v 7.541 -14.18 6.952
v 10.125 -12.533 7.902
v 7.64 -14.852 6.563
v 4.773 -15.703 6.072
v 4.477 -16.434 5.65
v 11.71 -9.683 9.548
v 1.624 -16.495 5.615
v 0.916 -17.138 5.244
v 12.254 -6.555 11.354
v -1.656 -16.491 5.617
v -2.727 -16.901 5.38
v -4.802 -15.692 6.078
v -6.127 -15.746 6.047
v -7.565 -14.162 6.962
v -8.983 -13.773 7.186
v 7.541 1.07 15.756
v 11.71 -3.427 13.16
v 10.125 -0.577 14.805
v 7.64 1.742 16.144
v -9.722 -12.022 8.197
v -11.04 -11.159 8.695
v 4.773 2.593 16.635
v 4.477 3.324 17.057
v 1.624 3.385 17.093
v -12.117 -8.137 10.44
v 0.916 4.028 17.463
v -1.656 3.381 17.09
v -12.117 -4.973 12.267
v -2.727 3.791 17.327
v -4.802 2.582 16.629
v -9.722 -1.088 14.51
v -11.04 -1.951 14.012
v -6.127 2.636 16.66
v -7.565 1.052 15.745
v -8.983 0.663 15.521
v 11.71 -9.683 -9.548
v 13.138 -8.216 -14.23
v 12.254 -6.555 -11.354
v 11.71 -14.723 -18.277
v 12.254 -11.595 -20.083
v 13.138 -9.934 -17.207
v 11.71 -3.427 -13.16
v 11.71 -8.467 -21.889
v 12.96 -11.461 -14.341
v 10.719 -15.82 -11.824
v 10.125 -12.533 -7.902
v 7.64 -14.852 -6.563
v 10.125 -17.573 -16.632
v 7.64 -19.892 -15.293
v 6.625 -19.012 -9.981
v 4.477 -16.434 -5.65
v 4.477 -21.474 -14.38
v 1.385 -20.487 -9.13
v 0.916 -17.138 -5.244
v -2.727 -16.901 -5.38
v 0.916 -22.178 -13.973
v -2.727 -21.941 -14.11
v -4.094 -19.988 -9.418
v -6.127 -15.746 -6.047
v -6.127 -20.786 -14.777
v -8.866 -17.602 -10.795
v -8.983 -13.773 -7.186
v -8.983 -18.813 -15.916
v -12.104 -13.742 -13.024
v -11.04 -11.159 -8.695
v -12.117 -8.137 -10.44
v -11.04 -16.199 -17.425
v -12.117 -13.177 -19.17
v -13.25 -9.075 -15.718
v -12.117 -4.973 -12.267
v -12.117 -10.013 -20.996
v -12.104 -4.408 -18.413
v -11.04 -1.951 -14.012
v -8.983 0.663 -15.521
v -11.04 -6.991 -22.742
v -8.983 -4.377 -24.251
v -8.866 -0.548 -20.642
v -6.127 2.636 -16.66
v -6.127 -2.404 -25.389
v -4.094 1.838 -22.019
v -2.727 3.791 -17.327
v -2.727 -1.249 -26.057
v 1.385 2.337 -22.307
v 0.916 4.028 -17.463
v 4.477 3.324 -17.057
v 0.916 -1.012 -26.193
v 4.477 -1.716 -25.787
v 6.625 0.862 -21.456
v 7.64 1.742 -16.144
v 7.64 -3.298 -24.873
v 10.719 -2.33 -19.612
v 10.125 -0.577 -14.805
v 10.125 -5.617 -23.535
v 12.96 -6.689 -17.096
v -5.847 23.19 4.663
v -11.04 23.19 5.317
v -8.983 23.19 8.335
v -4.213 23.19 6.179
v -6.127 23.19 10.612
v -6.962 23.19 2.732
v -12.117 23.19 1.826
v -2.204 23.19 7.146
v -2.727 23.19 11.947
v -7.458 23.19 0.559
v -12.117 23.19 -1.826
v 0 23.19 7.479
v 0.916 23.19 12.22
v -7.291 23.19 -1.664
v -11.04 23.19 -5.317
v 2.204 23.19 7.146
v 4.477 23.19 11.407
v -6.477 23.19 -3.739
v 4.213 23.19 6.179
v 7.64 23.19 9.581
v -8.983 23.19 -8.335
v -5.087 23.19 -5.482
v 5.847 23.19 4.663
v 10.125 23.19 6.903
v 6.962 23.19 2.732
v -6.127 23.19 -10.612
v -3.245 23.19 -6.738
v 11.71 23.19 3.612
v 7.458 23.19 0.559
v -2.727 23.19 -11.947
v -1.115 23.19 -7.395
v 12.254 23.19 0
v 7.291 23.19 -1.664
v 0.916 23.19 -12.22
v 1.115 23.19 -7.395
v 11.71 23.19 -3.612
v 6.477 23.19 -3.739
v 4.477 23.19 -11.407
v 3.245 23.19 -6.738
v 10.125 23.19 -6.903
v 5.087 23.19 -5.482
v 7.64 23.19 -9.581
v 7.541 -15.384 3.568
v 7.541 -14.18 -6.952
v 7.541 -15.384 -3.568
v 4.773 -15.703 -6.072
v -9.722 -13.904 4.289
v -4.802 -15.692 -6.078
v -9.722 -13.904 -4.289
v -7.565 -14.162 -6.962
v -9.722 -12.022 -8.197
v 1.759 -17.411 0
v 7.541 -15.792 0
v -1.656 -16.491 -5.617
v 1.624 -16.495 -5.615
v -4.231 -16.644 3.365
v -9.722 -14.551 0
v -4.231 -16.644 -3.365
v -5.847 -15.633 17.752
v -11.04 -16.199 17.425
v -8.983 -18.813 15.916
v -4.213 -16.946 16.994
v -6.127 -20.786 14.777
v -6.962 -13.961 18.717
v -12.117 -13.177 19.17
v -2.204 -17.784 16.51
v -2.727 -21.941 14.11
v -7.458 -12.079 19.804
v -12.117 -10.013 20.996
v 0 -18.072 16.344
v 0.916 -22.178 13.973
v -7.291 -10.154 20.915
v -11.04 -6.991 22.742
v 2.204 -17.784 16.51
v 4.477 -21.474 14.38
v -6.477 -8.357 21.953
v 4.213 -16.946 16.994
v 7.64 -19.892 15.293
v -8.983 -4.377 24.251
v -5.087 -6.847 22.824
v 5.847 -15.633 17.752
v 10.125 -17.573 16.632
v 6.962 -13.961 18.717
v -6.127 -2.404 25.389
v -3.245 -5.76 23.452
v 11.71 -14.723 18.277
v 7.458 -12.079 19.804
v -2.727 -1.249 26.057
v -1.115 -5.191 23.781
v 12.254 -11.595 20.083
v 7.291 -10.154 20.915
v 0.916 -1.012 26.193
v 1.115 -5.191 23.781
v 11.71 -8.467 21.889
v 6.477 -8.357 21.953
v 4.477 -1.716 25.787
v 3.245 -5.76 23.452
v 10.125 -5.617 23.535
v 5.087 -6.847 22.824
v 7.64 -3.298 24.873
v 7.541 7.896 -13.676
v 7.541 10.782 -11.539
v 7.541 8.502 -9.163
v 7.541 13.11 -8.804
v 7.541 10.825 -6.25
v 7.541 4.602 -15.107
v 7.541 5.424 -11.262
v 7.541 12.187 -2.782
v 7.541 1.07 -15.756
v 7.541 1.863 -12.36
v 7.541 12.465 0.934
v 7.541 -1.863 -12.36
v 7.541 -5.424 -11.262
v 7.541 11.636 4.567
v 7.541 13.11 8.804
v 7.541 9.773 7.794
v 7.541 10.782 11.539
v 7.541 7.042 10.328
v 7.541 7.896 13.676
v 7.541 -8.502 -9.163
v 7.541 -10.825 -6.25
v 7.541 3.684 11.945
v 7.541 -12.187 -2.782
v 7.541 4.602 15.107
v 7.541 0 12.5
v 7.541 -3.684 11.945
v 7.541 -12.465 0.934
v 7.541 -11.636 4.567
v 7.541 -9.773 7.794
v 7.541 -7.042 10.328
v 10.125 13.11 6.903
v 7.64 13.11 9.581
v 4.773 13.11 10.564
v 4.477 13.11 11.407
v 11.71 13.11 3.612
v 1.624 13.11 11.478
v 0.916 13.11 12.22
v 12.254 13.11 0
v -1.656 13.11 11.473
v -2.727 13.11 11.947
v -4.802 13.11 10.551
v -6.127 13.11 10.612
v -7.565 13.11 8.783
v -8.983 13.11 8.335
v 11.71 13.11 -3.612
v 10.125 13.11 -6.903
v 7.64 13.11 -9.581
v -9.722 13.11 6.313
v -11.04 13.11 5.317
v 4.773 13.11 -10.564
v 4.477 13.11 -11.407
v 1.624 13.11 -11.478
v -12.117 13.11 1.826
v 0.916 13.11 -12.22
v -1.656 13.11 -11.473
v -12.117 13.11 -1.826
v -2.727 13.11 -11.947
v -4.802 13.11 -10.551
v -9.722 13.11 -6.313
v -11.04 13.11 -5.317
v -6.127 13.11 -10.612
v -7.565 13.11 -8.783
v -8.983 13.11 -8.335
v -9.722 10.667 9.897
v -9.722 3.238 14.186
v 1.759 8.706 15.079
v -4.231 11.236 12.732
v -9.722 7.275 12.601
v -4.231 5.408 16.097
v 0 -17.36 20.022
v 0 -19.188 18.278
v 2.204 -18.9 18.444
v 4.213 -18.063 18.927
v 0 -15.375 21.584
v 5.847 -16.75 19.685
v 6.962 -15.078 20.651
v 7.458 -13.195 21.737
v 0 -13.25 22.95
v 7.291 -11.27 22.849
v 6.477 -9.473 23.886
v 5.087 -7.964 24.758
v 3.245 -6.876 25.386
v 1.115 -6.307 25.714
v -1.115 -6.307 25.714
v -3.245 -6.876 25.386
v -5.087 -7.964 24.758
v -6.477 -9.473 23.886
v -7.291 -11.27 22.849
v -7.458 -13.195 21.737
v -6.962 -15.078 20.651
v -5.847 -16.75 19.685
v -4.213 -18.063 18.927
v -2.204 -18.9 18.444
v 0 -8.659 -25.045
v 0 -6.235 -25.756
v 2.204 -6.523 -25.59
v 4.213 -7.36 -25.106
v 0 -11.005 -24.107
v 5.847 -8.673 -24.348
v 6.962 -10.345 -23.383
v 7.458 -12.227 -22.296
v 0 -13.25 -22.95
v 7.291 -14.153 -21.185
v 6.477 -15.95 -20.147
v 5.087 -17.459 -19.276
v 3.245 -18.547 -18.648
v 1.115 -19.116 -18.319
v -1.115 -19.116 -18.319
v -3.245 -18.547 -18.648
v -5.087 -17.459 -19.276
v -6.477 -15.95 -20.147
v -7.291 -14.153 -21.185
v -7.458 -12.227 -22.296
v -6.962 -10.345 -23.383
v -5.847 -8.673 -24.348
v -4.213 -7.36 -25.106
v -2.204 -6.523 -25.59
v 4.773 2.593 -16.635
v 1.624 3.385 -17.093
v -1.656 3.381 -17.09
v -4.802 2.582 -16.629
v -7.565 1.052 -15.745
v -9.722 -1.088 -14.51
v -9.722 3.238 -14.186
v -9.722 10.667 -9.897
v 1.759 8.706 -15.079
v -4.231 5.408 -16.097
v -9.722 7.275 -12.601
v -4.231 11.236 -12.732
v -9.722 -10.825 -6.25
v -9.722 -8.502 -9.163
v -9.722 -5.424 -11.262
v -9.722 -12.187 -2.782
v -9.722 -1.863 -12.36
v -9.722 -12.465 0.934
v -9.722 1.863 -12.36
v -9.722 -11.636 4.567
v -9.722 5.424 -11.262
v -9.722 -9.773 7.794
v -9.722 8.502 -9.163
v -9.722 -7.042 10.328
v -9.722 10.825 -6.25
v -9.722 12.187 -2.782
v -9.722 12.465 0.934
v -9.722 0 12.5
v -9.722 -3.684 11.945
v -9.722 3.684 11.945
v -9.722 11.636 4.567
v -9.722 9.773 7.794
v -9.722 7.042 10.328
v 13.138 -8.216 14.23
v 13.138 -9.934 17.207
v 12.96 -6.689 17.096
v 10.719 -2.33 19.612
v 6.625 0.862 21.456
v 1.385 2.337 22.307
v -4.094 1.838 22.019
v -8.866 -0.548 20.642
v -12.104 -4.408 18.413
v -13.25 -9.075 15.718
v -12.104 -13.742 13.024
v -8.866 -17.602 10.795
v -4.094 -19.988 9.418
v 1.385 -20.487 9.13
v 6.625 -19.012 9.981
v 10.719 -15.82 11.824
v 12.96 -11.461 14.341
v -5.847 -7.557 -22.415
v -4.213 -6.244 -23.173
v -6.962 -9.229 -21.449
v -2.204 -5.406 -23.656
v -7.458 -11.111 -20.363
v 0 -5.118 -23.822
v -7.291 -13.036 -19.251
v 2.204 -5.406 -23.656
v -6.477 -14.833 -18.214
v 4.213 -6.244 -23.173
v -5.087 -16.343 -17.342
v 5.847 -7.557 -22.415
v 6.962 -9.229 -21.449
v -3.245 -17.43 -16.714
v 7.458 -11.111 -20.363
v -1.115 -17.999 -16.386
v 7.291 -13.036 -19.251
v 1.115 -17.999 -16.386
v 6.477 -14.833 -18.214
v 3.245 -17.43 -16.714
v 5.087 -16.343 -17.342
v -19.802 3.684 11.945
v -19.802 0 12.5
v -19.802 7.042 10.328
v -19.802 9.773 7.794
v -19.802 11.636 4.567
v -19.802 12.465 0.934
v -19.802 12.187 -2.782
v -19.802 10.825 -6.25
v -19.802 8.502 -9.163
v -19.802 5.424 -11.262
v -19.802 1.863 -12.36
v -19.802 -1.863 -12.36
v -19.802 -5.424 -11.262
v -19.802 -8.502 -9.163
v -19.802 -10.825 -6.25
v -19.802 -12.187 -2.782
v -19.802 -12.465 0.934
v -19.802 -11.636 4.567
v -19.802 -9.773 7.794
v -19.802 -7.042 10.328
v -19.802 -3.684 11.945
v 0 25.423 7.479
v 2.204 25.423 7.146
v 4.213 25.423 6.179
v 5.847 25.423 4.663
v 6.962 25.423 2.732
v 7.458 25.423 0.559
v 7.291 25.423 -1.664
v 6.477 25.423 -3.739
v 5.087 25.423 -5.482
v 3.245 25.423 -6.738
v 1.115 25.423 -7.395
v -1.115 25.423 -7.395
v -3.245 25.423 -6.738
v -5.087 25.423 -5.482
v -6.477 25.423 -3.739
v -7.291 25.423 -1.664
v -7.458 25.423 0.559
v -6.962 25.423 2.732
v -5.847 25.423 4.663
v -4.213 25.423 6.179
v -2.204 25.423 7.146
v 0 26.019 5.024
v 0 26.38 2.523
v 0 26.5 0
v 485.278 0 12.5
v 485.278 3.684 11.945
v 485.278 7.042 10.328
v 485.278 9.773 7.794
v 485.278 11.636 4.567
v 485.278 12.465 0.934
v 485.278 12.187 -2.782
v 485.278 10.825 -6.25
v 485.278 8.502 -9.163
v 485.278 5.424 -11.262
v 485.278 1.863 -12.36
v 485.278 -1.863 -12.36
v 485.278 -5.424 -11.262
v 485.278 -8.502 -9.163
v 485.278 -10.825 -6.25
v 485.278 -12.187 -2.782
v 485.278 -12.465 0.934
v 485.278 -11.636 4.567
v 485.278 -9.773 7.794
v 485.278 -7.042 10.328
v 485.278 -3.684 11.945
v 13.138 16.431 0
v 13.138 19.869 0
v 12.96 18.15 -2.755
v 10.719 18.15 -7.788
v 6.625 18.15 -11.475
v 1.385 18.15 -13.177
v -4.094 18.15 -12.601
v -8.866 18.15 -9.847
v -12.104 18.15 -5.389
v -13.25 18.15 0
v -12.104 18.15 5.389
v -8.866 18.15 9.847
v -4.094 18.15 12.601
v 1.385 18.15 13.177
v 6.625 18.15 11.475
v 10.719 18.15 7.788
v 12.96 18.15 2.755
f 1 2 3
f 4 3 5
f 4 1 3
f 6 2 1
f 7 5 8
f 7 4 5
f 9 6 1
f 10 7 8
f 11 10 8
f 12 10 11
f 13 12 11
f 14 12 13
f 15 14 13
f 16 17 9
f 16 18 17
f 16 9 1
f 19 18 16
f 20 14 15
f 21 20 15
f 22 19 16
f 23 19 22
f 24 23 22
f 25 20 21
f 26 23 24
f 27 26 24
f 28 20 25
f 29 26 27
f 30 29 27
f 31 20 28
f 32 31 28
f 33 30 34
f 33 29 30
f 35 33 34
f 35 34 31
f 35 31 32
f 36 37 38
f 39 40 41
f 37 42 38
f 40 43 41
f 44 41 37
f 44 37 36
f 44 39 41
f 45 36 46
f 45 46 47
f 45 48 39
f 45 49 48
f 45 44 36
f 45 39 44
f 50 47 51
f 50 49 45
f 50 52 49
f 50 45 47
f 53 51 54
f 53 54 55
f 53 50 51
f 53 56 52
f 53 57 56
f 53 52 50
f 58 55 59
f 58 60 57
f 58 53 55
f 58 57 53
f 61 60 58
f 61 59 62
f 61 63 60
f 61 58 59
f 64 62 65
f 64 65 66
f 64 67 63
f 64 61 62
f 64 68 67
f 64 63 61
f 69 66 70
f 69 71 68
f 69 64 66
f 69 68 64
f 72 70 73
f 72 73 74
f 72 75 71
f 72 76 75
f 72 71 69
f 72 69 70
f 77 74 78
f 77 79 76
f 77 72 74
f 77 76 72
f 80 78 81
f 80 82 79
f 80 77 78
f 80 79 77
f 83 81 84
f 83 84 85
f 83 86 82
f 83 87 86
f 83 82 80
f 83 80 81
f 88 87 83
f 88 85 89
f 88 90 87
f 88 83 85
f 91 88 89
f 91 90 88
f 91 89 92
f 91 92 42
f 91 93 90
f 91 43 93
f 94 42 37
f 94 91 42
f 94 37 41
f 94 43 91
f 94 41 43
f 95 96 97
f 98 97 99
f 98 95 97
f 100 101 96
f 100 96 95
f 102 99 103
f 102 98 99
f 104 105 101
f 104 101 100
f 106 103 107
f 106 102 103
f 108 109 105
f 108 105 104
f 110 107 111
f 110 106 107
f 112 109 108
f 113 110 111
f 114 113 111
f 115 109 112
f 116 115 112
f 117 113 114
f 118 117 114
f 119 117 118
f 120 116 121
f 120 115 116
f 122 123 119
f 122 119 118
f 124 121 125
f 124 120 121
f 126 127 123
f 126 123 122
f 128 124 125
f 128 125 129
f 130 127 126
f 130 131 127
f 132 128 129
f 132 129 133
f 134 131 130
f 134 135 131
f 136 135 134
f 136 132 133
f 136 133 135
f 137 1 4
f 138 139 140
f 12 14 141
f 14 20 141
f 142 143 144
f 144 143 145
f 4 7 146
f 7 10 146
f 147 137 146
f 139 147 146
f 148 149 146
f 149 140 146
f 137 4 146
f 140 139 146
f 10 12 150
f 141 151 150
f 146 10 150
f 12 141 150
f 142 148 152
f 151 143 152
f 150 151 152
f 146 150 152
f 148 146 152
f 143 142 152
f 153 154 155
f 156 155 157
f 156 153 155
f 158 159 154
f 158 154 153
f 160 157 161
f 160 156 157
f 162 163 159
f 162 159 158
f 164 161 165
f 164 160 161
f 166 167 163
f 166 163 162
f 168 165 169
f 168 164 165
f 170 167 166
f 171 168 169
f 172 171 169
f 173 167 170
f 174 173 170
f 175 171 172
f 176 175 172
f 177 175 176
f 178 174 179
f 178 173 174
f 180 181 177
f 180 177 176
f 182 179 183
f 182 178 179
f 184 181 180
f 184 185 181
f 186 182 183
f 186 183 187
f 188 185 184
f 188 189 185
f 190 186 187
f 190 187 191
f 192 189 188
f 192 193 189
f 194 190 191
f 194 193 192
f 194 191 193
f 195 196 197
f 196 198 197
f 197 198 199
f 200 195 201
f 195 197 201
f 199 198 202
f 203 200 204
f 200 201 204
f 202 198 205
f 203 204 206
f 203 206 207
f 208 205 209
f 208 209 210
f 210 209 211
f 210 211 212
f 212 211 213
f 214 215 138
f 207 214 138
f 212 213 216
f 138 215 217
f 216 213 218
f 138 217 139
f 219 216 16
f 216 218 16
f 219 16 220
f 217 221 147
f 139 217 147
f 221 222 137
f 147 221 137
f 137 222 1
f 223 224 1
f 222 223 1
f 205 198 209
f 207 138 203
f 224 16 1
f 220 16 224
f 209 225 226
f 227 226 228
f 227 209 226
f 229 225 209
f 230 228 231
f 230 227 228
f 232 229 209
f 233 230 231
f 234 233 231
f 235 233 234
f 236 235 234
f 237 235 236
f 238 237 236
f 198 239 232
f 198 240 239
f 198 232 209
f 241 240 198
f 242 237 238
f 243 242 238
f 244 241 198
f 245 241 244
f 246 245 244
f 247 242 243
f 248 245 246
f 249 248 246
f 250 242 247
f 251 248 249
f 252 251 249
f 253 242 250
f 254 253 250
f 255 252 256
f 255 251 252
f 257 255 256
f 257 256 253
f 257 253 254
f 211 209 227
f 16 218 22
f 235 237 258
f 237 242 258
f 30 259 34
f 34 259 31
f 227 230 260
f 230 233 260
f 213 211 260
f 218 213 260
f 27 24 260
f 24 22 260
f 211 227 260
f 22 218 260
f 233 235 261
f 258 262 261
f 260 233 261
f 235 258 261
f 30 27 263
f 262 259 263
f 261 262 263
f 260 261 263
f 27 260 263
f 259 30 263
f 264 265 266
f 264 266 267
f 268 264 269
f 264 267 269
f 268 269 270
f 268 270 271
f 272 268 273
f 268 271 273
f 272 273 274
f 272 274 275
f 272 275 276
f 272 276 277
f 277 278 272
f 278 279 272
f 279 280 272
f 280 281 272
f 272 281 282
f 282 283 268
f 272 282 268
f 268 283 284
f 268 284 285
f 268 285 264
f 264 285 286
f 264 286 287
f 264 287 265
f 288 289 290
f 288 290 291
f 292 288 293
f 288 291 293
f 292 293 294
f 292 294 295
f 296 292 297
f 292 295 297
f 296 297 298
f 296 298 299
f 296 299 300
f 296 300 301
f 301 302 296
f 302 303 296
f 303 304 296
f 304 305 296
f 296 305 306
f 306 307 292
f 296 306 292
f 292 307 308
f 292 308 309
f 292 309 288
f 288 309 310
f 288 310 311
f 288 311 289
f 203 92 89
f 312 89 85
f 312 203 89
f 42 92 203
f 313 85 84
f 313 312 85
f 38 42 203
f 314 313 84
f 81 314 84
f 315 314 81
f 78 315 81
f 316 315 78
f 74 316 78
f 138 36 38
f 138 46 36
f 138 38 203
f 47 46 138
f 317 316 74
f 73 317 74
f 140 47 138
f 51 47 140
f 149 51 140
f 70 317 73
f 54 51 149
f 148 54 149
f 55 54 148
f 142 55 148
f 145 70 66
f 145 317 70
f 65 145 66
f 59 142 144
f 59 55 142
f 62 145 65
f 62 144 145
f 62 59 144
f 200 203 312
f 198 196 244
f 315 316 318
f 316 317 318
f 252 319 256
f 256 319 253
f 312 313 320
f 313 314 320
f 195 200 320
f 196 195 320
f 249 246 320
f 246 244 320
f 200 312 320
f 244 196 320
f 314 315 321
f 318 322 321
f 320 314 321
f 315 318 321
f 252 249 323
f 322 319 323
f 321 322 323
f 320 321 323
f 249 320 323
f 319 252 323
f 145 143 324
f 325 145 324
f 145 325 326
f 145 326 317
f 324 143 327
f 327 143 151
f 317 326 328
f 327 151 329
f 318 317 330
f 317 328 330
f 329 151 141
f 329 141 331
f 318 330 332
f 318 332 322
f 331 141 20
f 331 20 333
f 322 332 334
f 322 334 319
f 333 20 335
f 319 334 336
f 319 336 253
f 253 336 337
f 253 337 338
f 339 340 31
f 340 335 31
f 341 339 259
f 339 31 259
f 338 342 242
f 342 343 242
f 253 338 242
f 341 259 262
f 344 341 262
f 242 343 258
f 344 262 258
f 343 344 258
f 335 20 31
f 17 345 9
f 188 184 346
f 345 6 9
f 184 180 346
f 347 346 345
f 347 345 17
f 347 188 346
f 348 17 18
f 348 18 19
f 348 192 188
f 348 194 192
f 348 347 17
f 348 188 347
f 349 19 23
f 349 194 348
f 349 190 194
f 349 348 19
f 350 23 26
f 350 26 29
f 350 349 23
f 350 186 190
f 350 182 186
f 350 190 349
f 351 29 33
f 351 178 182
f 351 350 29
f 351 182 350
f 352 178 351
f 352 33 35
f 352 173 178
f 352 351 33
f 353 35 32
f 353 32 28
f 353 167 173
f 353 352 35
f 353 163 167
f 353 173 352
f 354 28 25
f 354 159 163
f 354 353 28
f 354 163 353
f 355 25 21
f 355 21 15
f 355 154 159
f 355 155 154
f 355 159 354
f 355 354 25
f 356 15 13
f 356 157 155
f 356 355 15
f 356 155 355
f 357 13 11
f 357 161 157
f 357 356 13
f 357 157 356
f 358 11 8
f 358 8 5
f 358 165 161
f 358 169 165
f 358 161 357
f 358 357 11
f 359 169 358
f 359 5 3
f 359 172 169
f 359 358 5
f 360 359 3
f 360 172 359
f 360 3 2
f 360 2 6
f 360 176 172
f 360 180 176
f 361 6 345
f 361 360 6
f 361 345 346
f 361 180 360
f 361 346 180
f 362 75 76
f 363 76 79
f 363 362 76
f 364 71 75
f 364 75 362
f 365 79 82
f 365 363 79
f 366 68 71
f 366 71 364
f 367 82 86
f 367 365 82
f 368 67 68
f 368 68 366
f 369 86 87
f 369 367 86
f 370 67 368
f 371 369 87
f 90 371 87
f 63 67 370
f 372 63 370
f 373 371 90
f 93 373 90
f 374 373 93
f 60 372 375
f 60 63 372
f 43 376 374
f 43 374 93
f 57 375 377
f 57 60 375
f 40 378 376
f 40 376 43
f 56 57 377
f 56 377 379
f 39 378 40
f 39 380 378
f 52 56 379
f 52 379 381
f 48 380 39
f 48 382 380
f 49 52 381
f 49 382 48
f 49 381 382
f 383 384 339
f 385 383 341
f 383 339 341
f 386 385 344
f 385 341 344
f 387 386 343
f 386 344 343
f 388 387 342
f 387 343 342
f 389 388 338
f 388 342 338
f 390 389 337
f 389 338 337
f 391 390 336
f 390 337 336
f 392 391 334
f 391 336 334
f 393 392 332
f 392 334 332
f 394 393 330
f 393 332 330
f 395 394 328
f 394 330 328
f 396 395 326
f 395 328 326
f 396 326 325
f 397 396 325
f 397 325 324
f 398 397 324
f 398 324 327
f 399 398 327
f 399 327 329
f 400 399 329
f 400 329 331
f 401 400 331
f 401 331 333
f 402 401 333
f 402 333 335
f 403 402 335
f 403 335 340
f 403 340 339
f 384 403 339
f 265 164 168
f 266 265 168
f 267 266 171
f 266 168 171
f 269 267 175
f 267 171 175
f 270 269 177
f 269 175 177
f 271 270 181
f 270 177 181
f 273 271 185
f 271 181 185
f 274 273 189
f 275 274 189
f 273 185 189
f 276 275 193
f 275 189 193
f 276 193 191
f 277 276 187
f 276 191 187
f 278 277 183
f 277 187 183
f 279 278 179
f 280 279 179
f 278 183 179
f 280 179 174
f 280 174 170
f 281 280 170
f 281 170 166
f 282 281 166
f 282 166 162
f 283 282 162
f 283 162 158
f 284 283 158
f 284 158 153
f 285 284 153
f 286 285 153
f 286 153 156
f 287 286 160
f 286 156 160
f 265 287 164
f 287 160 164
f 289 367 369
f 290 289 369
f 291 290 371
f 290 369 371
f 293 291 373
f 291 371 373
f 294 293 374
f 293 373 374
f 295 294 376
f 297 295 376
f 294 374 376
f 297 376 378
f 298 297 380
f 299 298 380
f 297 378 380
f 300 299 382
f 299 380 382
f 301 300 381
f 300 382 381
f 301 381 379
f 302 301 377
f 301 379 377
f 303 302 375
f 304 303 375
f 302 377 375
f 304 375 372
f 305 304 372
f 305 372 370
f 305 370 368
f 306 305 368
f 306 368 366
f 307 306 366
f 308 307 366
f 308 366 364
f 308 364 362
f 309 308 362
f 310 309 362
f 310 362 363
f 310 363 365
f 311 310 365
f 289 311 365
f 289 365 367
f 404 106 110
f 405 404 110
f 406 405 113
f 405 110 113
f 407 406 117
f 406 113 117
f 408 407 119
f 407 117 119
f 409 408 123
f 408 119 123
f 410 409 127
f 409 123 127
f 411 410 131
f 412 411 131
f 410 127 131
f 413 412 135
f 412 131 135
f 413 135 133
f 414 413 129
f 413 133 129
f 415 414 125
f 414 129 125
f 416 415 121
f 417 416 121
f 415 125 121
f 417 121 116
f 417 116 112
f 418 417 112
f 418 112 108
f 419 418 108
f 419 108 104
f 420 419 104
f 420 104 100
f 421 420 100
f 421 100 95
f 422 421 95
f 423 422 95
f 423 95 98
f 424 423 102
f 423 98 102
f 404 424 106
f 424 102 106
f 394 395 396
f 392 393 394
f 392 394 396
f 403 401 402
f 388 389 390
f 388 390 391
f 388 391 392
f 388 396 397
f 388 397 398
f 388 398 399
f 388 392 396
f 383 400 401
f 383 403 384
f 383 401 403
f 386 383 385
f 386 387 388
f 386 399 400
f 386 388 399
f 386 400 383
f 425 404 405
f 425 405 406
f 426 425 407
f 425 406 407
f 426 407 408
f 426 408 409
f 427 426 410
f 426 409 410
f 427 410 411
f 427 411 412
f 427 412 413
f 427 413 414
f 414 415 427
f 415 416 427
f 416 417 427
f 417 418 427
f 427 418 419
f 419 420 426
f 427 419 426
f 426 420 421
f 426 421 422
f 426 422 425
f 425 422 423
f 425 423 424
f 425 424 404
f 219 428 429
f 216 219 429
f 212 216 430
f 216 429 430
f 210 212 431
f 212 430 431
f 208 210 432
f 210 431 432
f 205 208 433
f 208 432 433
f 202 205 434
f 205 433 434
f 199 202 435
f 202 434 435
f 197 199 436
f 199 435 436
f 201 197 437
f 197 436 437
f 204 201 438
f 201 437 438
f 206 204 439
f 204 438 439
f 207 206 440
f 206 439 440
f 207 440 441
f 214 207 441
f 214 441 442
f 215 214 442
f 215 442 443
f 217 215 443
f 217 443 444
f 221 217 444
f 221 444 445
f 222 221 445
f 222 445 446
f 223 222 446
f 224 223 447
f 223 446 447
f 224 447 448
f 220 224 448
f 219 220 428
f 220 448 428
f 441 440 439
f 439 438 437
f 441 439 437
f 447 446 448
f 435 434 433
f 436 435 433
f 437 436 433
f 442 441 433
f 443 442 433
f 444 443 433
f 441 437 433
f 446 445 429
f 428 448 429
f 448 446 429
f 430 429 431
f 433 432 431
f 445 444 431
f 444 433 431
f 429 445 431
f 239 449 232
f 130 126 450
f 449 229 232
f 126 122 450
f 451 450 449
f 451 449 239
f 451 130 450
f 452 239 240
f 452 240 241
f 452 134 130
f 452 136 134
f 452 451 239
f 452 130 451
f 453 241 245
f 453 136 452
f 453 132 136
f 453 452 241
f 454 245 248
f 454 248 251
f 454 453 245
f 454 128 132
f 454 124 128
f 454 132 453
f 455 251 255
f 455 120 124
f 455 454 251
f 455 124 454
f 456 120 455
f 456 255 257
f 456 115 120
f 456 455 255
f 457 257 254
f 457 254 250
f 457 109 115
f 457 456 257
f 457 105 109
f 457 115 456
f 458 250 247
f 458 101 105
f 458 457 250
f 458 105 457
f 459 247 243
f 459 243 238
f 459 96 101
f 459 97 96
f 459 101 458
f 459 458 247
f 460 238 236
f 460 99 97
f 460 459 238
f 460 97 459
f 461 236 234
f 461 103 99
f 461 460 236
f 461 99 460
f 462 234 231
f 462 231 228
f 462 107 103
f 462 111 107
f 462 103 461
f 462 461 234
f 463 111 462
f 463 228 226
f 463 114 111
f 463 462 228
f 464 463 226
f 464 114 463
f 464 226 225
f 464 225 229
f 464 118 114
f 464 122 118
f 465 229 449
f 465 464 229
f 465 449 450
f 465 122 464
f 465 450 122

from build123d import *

# Parameters (mm, degrees)
CUT_EXTRUDE1_DEPTH       = 31.174758882
BOSS_EXTRUDE1_START      = 13.11
BOSS_EXTRUDE1_OUTLINE_R  = 7.478502705
BOSS_EXTRUDE1_DEPTH      = 10.08
CIRPATTERN1_COUNT        = 3
BOSS_EXTRUDE2_DEPTH      = 10.08
BOSS_EXTRUDE2_DEPTH_BACK = 495
SKETCH6_R                = 12.5


# Read off the part's stored shape, not the designer's step: Boss-Extrude1, Revolve3
with BuildPart() as part:
    # Sketch1 → Revolve1 (revolve)
    with BuildSketch(Plane.XY):
        with BuildLine():
            Line((-9.722222222, 14.550889837), (-9.722222222, 12.5))
            Line((-9.722222222, 12.5), (7.540919832, 12.5))
            Line((7.540919832, 12.5), (7.540919832, 15.791913376))
            ThreePointArc((7.540919832, 15.791913376), (-1.254812689, 17.454954744), (-9.722222222, 14.550889837))
        make_face()
    revolve(axis=Axis((-47.061566383, 0, 0), (1, 0, 0)))

    # Sketch2 → Cut-Extrude1 (cut, symmetric)
    with BuildSketch(Plane(origin=(7.540919832, 0, 0), x_dir=(0, 0, -1), z_dir=(1, 0, 0))):
        Polygon((-17.183661108, 13.11), (20.1337897, 13.11), (18.772985043, 23.764289573), (-17.183661108, 23.764289573), align=None)
    cut_extrude1 = extrude(amount=CUT_EXTRUDE1_DEPTH, both=True, mode=Mode.SUBTRACT)

    # Boss-Extrude1 outline → Boss-Extrude1 (add)
    with BuildSketch(Plane(origin=(0, 0, 0), x_dir=(1, 0, 0), z_dir=(0, 1, 0)).offset(BOSS_EXTRUDE1_START)):
        Circle(BOSS_EXTRUDE1_OUTLINE_R)
    boss_extrude1 = extrude(amount=BOSS_EXTRUDE1_DEPTH)

    # Sketch4 → Revolve2 (revolve)
    with BuildSketch(Plane(origin=(0, 0, 0), x_dir=(0, 0, -1), z_dir=(1, 0, 0)), mode=Mode.PRIVATE) as revolve2_sk:
        with BuildLine():
            Line((7.478502705, 25.422863672), (7.478502705, 23.19))
            Line((7.478502705, 23.19), (0, 23.19))
            Line((0, 23.19), (0, 26.5))
            ThreePointArc((0, 26.5), (3.777837522, 26.229333649), (7.478502705, 25.422863672))
        make_face()
    revolve2 = revolve(revolve2_sk.sketch.rotate(Axis((0, 0, 0), (0, 1, 0)), 180), axis=Axis((0, 0, 0), (0, 1, 0)))

    # Revolve3 outline → Revolve3 (revolve)
    with BuildSketch(Plane.XY):
        with BuildLine():
            Line((7.478502705, 23.190000012), (7.478502705, 13.109999988))
            Line((7.478502705, 13.109999988), (12.254015665, 13.109999994))
            ThreePointArc((12.254015665, 13.109999994), (13.25, 18.15), (12.254015665, 23.190000006))
            Line((12.254015665, 23.190000006), (7.478502705, 23.190000012))
        make_face()
    revolve3 = revolve(axis=Axis((0, 0, 0), (0, 1, 0)))

    # CirPattern1: Cut-Extrude1, Boss-Extrude1, Revolve2, Revolve3 ×3 about axis
    cirpattern1_axis = Axis((0, 0, 0), (1, 0, 0))
    add([cut_extrude1.rotate(cirpattern1_axis, i * 360 / CIRPATTERN1_COUNT) for i in range(1, CIRPATTERN1_COUNT)], mode=Mode.SUBTRACT)
    add([boss_extrude1.rotate(cirpattern1_axis, i * 360 / CIRPATTERN1_COUNT) for i in range(1, CIRPATTERN1_COUNT)])
    add([revolve2.rotate(cirpattern1_axis, i * 360 / CIRPATTERN1_COUNT) for i in range(1, CIRPATTERN1_COUNT)])
    add([revolve3.rotate(cirpattern1_axis, i * 360 / CIRPATTERN1_COUNT) for i in range(1, CIRPATTERN1_COUNT)])

    # Sketch6 → Boss-Extrude2 (add, two sides: drawn at the far end of the back side and taken through both)
    with BuildSketch(Plane.ZY.offset(9.722222222).offset(-BOSS_EXTRUDE2_DEPTH_BACK)):
        Circle(SKETCH6_R)
    extrude(amount=BOSS_EXTRUDE2_DEPTH + BOSS_EXTRUDE2_DEPTH_BACK)


solid = part.part
